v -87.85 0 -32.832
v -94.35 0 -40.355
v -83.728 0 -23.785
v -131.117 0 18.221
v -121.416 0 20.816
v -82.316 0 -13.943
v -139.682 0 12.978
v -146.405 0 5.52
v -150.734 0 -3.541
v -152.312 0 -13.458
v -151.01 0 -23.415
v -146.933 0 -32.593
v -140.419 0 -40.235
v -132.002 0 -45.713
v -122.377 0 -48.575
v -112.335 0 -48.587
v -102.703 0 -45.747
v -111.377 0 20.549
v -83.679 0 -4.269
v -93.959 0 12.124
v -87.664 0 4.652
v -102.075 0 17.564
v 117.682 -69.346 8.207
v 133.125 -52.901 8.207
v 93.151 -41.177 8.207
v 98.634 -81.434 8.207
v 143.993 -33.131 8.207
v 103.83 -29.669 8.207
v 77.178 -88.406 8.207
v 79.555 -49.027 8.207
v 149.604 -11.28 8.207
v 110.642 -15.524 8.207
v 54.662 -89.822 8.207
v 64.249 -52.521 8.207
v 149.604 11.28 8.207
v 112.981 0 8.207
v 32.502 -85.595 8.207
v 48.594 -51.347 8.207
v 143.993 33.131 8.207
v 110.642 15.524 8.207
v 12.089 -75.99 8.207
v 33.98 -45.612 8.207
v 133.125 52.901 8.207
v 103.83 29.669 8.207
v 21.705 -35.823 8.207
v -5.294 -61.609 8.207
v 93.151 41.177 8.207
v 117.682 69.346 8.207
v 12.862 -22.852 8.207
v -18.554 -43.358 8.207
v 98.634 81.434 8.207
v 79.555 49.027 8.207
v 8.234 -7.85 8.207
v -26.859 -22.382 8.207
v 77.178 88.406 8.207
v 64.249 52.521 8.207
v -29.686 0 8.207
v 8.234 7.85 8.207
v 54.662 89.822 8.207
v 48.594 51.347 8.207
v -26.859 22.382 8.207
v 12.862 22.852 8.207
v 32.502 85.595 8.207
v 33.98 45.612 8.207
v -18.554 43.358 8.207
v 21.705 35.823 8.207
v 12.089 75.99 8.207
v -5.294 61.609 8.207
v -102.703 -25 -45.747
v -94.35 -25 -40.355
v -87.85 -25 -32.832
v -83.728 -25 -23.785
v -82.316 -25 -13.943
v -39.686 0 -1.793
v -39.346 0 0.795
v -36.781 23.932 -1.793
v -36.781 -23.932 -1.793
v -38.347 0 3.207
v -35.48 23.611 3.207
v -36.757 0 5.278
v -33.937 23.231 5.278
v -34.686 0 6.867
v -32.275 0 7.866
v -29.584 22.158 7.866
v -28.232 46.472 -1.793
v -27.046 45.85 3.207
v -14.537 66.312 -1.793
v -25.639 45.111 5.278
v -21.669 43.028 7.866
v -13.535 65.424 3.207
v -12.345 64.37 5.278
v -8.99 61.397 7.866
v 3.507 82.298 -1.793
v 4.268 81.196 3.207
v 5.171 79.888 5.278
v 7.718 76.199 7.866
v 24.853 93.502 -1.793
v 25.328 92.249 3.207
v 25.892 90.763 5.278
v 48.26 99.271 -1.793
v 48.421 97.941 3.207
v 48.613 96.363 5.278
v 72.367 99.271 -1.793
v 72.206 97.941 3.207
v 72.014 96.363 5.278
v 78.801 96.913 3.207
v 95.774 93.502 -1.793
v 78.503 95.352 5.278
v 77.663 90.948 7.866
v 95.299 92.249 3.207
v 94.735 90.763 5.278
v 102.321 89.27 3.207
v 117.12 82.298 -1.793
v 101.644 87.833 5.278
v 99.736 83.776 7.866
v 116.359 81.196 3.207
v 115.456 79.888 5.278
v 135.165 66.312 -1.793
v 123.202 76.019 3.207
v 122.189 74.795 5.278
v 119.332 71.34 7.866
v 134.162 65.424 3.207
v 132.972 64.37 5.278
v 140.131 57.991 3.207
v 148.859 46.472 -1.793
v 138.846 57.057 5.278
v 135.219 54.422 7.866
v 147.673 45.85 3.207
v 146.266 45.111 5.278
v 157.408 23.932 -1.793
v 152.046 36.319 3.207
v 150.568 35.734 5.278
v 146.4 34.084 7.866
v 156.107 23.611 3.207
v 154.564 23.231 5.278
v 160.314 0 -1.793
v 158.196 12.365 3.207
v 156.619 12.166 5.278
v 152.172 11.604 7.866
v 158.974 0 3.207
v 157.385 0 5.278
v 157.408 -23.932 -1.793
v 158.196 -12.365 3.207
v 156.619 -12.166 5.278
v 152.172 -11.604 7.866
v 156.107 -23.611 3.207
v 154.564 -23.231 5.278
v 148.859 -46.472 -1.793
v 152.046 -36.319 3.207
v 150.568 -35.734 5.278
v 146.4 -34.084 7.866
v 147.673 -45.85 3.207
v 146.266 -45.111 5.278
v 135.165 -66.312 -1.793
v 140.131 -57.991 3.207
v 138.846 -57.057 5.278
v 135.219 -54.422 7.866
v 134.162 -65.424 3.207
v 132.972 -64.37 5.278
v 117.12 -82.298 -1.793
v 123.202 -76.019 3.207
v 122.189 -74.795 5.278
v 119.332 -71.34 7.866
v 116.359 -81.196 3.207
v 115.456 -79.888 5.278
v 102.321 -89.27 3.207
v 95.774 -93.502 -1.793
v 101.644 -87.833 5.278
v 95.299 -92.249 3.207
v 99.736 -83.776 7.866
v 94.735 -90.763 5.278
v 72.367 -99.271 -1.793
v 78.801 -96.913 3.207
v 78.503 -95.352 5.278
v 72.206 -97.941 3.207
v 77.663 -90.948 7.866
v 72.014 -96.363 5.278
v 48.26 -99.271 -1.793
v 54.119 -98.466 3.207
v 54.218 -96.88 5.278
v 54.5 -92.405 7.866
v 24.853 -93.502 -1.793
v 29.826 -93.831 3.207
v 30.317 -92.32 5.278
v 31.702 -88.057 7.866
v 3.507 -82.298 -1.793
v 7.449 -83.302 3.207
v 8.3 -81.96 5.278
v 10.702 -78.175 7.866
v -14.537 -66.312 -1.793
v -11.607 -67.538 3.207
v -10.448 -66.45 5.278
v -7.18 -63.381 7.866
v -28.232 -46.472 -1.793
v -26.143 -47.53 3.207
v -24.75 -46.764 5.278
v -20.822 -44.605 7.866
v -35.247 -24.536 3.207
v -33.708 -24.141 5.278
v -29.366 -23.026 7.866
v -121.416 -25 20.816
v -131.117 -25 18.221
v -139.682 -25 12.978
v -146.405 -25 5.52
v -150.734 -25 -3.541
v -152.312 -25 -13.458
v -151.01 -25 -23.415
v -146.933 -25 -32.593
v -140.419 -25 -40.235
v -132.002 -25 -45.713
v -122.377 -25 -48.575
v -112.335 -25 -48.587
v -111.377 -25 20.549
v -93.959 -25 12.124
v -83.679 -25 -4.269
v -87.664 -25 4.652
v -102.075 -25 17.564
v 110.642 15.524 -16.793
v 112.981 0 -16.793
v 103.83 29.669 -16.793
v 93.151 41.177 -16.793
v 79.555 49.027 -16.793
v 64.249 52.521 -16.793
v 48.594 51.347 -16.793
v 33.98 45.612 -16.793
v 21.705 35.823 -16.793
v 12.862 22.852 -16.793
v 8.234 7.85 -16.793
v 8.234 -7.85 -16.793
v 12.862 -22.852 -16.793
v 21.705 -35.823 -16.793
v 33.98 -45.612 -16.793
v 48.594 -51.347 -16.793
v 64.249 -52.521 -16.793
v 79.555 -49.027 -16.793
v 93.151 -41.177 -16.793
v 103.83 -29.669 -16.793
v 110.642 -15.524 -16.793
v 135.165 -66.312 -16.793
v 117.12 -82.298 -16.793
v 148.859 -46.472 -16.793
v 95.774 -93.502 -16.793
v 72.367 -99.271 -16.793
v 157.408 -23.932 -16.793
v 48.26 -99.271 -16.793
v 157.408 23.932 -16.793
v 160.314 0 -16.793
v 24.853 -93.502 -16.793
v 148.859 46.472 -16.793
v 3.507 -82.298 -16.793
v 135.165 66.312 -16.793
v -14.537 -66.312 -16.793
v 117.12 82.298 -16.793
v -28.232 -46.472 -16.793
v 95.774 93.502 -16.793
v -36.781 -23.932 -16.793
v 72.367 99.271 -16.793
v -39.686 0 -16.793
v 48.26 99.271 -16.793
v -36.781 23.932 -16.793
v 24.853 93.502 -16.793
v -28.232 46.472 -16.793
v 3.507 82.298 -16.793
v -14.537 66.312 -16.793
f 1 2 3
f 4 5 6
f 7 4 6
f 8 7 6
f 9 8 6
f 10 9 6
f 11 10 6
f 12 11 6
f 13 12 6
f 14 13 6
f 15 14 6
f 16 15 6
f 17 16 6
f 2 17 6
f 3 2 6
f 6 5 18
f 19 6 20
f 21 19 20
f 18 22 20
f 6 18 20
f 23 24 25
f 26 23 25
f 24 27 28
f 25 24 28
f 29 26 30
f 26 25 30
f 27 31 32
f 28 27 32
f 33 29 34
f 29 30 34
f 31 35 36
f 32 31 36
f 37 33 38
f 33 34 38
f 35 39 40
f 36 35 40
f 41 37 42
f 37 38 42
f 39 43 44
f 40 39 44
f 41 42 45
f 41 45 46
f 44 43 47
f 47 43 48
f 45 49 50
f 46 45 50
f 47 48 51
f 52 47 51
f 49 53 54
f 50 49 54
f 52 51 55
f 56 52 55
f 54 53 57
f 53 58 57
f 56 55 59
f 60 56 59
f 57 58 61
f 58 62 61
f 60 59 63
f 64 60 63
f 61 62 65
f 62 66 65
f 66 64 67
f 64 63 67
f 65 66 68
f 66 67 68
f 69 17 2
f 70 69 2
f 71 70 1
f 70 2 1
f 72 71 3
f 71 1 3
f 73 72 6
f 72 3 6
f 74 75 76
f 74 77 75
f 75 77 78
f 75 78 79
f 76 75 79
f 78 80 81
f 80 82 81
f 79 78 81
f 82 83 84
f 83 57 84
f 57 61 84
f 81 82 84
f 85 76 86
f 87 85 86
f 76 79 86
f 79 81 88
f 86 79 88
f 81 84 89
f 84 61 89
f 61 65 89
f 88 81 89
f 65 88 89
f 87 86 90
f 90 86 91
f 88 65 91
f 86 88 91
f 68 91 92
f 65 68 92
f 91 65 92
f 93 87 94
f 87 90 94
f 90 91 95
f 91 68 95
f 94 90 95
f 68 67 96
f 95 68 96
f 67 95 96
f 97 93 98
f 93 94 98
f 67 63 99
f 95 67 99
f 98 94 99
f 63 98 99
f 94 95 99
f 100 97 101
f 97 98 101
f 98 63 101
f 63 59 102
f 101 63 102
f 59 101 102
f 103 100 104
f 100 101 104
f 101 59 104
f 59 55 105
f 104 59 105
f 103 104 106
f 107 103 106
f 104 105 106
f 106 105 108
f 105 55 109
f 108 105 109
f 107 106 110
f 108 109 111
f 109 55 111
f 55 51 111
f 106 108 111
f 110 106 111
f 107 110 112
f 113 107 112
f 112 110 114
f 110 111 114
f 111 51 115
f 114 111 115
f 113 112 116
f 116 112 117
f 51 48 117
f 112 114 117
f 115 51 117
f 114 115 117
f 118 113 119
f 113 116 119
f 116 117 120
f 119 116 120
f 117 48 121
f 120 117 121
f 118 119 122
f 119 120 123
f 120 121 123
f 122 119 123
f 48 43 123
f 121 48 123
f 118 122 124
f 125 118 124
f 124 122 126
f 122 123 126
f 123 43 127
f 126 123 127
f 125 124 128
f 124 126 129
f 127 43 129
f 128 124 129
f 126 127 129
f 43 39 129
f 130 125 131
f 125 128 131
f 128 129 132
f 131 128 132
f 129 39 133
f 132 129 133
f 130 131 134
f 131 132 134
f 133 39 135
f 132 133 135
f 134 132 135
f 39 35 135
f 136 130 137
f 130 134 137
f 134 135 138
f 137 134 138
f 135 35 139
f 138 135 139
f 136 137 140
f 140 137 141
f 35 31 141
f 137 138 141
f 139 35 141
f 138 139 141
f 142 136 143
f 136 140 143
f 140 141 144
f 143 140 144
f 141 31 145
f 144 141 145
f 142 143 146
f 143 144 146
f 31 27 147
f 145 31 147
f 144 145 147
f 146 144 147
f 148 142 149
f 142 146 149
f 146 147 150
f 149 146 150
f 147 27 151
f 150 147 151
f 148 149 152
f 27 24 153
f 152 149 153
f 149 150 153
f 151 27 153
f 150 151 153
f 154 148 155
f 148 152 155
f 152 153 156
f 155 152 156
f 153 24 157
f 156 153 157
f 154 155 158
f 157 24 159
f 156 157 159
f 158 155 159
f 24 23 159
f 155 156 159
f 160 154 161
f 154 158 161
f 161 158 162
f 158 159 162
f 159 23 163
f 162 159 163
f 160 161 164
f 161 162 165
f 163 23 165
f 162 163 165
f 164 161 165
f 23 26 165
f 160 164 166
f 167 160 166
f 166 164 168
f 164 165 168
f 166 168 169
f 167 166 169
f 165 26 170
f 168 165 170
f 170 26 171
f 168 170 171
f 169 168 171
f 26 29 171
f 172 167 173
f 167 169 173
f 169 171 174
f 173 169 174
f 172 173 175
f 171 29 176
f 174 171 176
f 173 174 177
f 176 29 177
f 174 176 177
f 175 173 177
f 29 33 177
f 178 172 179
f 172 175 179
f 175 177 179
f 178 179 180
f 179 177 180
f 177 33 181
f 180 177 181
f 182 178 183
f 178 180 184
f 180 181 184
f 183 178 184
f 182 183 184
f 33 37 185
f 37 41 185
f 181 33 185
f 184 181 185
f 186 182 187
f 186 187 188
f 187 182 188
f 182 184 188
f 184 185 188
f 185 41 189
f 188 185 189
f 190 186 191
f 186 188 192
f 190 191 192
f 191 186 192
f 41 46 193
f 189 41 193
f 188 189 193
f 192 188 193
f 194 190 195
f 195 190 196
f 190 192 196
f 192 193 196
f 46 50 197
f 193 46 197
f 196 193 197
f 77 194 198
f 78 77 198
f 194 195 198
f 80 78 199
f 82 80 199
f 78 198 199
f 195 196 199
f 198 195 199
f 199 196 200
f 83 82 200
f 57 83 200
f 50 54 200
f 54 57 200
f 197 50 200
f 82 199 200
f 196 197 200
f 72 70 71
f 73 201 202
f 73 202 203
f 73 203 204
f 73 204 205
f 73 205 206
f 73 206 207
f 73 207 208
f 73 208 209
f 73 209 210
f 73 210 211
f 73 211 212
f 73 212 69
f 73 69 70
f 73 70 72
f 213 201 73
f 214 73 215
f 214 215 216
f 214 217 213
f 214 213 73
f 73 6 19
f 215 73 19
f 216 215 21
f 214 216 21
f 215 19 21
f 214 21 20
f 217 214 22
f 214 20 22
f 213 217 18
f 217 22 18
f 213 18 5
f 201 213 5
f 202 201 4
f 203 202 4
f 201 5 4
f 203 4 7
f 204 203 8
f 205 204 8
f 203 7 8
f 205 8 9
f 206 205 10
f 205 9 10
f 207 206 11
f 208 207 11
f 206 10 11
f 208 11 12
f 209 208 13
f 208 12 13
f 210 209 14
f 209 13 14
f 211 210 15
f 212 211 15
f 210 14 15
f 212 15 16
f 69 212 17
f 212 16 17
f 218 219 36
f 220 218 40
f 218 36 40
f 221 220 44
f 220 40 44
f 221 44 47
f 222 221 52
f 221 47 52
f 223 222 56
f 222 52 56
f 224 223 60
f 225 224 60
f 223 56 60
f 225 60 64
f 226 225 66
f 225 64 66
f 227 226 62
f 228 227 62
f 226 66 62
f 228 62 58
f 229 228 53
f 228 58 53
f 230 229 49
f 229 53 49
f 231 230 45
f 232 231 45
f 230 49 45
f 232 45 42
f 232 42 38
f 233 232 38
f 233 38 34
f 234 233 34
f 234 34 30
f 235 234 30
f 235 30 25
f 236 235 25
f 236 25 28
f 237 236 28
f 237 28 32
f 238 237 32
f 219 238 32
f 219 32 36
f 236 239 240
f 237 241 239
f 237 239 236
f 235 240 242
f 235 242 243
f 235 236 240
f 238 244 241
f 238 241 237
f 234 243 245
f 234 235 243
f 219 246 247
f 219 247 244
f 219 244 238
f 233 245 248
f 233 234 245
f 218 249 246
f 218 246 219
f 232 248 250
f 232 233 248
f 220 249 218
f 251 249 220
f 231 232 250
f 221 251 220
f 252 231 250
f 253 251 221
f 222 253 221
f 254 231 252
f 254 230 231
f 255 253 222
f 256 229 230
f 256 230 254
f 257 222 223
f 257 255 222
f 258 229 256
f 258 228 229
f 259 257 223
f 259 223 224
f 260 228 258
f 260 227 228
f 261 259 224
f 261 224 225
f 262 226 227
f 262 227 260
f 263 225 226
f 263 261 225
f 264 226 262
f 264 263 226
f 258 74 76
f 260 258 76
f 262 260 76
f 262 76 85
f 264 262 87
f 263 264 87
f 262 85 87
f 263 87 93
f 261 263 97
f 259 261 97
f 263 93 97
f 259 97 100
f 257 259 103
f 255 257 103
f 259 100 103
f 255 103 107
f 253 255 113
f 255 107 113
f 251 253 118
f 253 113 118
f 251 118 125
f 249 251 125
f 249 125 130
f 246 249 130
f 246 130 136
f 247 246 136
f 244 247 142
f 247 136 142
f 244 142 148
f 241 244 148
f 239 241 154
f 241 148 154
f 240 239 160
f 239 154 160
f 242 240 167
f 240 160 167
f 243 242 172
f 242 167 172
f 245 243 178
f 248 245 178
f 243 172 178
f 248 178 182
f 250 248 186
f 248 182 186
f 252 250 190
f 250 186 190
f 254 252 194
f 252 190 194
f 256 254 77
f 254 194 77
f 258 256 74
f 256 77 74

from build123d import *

# Parameters (mm, degrees)
F1_DEPTH = 25
F0_W     = 100
F0_H     = 25
F3_R     = 52.6678538914
F4_DEPTH = 57.1510077662
F5_R     = 10


with BuildPart() as f1:
    # F0 (on Front) → F1 (new body)
    with BuildSketch(Plane.XZ):
        with BuildLine():
            ThreePointArc((-82.3157624928, -13.9432047871), (-90.5497209026, 8.6084917698), (-111.3774206411, 20.5493465255))
            ThreePointArc((-111.3774206411, 20.5493465255), (-152.0199728395, -18.4838858165), (-102.7032546994, -45.7468935038))
            ThreePointArc((-102.7032546994, -45.7468935038), (-87.8502082576, -32.8318551787), (-82.3157624928, -13.9432047871))
        make_face()
    extrude(amount=F1_DEPTH)


with BuildPart() as f2:
    # F0 (on Front) → F2 (revolve)
    with BuildSketch(Plane.XZ):
        with Locations((10.3136047721, -4.2931970209)):
            Rectangle(F0_W, F0_H)
    revolve(axis=Axis((60.3136047721, 0, -4.2931970209), (0, 0, -1)))

    # F3 (on face) → F4 (cut, through all)
    with BuildSketch(Plane.XY.offset(8.2068029791)):
        with Locations((60.3136047721, 0)):
            Circle(F3_R)
    extrude(amount=-F4_DEPTH, mode=Mode.SUBTRACT)

    # F5
    f5_edges = [f2.edges().sort_by_distance(p)[0] for p in [
        (160.313605, 0, 8.206803),
    ]]
    fillet(f5_edges, radius=F5_R)


solid = Compound([f1.part, f2.part])
